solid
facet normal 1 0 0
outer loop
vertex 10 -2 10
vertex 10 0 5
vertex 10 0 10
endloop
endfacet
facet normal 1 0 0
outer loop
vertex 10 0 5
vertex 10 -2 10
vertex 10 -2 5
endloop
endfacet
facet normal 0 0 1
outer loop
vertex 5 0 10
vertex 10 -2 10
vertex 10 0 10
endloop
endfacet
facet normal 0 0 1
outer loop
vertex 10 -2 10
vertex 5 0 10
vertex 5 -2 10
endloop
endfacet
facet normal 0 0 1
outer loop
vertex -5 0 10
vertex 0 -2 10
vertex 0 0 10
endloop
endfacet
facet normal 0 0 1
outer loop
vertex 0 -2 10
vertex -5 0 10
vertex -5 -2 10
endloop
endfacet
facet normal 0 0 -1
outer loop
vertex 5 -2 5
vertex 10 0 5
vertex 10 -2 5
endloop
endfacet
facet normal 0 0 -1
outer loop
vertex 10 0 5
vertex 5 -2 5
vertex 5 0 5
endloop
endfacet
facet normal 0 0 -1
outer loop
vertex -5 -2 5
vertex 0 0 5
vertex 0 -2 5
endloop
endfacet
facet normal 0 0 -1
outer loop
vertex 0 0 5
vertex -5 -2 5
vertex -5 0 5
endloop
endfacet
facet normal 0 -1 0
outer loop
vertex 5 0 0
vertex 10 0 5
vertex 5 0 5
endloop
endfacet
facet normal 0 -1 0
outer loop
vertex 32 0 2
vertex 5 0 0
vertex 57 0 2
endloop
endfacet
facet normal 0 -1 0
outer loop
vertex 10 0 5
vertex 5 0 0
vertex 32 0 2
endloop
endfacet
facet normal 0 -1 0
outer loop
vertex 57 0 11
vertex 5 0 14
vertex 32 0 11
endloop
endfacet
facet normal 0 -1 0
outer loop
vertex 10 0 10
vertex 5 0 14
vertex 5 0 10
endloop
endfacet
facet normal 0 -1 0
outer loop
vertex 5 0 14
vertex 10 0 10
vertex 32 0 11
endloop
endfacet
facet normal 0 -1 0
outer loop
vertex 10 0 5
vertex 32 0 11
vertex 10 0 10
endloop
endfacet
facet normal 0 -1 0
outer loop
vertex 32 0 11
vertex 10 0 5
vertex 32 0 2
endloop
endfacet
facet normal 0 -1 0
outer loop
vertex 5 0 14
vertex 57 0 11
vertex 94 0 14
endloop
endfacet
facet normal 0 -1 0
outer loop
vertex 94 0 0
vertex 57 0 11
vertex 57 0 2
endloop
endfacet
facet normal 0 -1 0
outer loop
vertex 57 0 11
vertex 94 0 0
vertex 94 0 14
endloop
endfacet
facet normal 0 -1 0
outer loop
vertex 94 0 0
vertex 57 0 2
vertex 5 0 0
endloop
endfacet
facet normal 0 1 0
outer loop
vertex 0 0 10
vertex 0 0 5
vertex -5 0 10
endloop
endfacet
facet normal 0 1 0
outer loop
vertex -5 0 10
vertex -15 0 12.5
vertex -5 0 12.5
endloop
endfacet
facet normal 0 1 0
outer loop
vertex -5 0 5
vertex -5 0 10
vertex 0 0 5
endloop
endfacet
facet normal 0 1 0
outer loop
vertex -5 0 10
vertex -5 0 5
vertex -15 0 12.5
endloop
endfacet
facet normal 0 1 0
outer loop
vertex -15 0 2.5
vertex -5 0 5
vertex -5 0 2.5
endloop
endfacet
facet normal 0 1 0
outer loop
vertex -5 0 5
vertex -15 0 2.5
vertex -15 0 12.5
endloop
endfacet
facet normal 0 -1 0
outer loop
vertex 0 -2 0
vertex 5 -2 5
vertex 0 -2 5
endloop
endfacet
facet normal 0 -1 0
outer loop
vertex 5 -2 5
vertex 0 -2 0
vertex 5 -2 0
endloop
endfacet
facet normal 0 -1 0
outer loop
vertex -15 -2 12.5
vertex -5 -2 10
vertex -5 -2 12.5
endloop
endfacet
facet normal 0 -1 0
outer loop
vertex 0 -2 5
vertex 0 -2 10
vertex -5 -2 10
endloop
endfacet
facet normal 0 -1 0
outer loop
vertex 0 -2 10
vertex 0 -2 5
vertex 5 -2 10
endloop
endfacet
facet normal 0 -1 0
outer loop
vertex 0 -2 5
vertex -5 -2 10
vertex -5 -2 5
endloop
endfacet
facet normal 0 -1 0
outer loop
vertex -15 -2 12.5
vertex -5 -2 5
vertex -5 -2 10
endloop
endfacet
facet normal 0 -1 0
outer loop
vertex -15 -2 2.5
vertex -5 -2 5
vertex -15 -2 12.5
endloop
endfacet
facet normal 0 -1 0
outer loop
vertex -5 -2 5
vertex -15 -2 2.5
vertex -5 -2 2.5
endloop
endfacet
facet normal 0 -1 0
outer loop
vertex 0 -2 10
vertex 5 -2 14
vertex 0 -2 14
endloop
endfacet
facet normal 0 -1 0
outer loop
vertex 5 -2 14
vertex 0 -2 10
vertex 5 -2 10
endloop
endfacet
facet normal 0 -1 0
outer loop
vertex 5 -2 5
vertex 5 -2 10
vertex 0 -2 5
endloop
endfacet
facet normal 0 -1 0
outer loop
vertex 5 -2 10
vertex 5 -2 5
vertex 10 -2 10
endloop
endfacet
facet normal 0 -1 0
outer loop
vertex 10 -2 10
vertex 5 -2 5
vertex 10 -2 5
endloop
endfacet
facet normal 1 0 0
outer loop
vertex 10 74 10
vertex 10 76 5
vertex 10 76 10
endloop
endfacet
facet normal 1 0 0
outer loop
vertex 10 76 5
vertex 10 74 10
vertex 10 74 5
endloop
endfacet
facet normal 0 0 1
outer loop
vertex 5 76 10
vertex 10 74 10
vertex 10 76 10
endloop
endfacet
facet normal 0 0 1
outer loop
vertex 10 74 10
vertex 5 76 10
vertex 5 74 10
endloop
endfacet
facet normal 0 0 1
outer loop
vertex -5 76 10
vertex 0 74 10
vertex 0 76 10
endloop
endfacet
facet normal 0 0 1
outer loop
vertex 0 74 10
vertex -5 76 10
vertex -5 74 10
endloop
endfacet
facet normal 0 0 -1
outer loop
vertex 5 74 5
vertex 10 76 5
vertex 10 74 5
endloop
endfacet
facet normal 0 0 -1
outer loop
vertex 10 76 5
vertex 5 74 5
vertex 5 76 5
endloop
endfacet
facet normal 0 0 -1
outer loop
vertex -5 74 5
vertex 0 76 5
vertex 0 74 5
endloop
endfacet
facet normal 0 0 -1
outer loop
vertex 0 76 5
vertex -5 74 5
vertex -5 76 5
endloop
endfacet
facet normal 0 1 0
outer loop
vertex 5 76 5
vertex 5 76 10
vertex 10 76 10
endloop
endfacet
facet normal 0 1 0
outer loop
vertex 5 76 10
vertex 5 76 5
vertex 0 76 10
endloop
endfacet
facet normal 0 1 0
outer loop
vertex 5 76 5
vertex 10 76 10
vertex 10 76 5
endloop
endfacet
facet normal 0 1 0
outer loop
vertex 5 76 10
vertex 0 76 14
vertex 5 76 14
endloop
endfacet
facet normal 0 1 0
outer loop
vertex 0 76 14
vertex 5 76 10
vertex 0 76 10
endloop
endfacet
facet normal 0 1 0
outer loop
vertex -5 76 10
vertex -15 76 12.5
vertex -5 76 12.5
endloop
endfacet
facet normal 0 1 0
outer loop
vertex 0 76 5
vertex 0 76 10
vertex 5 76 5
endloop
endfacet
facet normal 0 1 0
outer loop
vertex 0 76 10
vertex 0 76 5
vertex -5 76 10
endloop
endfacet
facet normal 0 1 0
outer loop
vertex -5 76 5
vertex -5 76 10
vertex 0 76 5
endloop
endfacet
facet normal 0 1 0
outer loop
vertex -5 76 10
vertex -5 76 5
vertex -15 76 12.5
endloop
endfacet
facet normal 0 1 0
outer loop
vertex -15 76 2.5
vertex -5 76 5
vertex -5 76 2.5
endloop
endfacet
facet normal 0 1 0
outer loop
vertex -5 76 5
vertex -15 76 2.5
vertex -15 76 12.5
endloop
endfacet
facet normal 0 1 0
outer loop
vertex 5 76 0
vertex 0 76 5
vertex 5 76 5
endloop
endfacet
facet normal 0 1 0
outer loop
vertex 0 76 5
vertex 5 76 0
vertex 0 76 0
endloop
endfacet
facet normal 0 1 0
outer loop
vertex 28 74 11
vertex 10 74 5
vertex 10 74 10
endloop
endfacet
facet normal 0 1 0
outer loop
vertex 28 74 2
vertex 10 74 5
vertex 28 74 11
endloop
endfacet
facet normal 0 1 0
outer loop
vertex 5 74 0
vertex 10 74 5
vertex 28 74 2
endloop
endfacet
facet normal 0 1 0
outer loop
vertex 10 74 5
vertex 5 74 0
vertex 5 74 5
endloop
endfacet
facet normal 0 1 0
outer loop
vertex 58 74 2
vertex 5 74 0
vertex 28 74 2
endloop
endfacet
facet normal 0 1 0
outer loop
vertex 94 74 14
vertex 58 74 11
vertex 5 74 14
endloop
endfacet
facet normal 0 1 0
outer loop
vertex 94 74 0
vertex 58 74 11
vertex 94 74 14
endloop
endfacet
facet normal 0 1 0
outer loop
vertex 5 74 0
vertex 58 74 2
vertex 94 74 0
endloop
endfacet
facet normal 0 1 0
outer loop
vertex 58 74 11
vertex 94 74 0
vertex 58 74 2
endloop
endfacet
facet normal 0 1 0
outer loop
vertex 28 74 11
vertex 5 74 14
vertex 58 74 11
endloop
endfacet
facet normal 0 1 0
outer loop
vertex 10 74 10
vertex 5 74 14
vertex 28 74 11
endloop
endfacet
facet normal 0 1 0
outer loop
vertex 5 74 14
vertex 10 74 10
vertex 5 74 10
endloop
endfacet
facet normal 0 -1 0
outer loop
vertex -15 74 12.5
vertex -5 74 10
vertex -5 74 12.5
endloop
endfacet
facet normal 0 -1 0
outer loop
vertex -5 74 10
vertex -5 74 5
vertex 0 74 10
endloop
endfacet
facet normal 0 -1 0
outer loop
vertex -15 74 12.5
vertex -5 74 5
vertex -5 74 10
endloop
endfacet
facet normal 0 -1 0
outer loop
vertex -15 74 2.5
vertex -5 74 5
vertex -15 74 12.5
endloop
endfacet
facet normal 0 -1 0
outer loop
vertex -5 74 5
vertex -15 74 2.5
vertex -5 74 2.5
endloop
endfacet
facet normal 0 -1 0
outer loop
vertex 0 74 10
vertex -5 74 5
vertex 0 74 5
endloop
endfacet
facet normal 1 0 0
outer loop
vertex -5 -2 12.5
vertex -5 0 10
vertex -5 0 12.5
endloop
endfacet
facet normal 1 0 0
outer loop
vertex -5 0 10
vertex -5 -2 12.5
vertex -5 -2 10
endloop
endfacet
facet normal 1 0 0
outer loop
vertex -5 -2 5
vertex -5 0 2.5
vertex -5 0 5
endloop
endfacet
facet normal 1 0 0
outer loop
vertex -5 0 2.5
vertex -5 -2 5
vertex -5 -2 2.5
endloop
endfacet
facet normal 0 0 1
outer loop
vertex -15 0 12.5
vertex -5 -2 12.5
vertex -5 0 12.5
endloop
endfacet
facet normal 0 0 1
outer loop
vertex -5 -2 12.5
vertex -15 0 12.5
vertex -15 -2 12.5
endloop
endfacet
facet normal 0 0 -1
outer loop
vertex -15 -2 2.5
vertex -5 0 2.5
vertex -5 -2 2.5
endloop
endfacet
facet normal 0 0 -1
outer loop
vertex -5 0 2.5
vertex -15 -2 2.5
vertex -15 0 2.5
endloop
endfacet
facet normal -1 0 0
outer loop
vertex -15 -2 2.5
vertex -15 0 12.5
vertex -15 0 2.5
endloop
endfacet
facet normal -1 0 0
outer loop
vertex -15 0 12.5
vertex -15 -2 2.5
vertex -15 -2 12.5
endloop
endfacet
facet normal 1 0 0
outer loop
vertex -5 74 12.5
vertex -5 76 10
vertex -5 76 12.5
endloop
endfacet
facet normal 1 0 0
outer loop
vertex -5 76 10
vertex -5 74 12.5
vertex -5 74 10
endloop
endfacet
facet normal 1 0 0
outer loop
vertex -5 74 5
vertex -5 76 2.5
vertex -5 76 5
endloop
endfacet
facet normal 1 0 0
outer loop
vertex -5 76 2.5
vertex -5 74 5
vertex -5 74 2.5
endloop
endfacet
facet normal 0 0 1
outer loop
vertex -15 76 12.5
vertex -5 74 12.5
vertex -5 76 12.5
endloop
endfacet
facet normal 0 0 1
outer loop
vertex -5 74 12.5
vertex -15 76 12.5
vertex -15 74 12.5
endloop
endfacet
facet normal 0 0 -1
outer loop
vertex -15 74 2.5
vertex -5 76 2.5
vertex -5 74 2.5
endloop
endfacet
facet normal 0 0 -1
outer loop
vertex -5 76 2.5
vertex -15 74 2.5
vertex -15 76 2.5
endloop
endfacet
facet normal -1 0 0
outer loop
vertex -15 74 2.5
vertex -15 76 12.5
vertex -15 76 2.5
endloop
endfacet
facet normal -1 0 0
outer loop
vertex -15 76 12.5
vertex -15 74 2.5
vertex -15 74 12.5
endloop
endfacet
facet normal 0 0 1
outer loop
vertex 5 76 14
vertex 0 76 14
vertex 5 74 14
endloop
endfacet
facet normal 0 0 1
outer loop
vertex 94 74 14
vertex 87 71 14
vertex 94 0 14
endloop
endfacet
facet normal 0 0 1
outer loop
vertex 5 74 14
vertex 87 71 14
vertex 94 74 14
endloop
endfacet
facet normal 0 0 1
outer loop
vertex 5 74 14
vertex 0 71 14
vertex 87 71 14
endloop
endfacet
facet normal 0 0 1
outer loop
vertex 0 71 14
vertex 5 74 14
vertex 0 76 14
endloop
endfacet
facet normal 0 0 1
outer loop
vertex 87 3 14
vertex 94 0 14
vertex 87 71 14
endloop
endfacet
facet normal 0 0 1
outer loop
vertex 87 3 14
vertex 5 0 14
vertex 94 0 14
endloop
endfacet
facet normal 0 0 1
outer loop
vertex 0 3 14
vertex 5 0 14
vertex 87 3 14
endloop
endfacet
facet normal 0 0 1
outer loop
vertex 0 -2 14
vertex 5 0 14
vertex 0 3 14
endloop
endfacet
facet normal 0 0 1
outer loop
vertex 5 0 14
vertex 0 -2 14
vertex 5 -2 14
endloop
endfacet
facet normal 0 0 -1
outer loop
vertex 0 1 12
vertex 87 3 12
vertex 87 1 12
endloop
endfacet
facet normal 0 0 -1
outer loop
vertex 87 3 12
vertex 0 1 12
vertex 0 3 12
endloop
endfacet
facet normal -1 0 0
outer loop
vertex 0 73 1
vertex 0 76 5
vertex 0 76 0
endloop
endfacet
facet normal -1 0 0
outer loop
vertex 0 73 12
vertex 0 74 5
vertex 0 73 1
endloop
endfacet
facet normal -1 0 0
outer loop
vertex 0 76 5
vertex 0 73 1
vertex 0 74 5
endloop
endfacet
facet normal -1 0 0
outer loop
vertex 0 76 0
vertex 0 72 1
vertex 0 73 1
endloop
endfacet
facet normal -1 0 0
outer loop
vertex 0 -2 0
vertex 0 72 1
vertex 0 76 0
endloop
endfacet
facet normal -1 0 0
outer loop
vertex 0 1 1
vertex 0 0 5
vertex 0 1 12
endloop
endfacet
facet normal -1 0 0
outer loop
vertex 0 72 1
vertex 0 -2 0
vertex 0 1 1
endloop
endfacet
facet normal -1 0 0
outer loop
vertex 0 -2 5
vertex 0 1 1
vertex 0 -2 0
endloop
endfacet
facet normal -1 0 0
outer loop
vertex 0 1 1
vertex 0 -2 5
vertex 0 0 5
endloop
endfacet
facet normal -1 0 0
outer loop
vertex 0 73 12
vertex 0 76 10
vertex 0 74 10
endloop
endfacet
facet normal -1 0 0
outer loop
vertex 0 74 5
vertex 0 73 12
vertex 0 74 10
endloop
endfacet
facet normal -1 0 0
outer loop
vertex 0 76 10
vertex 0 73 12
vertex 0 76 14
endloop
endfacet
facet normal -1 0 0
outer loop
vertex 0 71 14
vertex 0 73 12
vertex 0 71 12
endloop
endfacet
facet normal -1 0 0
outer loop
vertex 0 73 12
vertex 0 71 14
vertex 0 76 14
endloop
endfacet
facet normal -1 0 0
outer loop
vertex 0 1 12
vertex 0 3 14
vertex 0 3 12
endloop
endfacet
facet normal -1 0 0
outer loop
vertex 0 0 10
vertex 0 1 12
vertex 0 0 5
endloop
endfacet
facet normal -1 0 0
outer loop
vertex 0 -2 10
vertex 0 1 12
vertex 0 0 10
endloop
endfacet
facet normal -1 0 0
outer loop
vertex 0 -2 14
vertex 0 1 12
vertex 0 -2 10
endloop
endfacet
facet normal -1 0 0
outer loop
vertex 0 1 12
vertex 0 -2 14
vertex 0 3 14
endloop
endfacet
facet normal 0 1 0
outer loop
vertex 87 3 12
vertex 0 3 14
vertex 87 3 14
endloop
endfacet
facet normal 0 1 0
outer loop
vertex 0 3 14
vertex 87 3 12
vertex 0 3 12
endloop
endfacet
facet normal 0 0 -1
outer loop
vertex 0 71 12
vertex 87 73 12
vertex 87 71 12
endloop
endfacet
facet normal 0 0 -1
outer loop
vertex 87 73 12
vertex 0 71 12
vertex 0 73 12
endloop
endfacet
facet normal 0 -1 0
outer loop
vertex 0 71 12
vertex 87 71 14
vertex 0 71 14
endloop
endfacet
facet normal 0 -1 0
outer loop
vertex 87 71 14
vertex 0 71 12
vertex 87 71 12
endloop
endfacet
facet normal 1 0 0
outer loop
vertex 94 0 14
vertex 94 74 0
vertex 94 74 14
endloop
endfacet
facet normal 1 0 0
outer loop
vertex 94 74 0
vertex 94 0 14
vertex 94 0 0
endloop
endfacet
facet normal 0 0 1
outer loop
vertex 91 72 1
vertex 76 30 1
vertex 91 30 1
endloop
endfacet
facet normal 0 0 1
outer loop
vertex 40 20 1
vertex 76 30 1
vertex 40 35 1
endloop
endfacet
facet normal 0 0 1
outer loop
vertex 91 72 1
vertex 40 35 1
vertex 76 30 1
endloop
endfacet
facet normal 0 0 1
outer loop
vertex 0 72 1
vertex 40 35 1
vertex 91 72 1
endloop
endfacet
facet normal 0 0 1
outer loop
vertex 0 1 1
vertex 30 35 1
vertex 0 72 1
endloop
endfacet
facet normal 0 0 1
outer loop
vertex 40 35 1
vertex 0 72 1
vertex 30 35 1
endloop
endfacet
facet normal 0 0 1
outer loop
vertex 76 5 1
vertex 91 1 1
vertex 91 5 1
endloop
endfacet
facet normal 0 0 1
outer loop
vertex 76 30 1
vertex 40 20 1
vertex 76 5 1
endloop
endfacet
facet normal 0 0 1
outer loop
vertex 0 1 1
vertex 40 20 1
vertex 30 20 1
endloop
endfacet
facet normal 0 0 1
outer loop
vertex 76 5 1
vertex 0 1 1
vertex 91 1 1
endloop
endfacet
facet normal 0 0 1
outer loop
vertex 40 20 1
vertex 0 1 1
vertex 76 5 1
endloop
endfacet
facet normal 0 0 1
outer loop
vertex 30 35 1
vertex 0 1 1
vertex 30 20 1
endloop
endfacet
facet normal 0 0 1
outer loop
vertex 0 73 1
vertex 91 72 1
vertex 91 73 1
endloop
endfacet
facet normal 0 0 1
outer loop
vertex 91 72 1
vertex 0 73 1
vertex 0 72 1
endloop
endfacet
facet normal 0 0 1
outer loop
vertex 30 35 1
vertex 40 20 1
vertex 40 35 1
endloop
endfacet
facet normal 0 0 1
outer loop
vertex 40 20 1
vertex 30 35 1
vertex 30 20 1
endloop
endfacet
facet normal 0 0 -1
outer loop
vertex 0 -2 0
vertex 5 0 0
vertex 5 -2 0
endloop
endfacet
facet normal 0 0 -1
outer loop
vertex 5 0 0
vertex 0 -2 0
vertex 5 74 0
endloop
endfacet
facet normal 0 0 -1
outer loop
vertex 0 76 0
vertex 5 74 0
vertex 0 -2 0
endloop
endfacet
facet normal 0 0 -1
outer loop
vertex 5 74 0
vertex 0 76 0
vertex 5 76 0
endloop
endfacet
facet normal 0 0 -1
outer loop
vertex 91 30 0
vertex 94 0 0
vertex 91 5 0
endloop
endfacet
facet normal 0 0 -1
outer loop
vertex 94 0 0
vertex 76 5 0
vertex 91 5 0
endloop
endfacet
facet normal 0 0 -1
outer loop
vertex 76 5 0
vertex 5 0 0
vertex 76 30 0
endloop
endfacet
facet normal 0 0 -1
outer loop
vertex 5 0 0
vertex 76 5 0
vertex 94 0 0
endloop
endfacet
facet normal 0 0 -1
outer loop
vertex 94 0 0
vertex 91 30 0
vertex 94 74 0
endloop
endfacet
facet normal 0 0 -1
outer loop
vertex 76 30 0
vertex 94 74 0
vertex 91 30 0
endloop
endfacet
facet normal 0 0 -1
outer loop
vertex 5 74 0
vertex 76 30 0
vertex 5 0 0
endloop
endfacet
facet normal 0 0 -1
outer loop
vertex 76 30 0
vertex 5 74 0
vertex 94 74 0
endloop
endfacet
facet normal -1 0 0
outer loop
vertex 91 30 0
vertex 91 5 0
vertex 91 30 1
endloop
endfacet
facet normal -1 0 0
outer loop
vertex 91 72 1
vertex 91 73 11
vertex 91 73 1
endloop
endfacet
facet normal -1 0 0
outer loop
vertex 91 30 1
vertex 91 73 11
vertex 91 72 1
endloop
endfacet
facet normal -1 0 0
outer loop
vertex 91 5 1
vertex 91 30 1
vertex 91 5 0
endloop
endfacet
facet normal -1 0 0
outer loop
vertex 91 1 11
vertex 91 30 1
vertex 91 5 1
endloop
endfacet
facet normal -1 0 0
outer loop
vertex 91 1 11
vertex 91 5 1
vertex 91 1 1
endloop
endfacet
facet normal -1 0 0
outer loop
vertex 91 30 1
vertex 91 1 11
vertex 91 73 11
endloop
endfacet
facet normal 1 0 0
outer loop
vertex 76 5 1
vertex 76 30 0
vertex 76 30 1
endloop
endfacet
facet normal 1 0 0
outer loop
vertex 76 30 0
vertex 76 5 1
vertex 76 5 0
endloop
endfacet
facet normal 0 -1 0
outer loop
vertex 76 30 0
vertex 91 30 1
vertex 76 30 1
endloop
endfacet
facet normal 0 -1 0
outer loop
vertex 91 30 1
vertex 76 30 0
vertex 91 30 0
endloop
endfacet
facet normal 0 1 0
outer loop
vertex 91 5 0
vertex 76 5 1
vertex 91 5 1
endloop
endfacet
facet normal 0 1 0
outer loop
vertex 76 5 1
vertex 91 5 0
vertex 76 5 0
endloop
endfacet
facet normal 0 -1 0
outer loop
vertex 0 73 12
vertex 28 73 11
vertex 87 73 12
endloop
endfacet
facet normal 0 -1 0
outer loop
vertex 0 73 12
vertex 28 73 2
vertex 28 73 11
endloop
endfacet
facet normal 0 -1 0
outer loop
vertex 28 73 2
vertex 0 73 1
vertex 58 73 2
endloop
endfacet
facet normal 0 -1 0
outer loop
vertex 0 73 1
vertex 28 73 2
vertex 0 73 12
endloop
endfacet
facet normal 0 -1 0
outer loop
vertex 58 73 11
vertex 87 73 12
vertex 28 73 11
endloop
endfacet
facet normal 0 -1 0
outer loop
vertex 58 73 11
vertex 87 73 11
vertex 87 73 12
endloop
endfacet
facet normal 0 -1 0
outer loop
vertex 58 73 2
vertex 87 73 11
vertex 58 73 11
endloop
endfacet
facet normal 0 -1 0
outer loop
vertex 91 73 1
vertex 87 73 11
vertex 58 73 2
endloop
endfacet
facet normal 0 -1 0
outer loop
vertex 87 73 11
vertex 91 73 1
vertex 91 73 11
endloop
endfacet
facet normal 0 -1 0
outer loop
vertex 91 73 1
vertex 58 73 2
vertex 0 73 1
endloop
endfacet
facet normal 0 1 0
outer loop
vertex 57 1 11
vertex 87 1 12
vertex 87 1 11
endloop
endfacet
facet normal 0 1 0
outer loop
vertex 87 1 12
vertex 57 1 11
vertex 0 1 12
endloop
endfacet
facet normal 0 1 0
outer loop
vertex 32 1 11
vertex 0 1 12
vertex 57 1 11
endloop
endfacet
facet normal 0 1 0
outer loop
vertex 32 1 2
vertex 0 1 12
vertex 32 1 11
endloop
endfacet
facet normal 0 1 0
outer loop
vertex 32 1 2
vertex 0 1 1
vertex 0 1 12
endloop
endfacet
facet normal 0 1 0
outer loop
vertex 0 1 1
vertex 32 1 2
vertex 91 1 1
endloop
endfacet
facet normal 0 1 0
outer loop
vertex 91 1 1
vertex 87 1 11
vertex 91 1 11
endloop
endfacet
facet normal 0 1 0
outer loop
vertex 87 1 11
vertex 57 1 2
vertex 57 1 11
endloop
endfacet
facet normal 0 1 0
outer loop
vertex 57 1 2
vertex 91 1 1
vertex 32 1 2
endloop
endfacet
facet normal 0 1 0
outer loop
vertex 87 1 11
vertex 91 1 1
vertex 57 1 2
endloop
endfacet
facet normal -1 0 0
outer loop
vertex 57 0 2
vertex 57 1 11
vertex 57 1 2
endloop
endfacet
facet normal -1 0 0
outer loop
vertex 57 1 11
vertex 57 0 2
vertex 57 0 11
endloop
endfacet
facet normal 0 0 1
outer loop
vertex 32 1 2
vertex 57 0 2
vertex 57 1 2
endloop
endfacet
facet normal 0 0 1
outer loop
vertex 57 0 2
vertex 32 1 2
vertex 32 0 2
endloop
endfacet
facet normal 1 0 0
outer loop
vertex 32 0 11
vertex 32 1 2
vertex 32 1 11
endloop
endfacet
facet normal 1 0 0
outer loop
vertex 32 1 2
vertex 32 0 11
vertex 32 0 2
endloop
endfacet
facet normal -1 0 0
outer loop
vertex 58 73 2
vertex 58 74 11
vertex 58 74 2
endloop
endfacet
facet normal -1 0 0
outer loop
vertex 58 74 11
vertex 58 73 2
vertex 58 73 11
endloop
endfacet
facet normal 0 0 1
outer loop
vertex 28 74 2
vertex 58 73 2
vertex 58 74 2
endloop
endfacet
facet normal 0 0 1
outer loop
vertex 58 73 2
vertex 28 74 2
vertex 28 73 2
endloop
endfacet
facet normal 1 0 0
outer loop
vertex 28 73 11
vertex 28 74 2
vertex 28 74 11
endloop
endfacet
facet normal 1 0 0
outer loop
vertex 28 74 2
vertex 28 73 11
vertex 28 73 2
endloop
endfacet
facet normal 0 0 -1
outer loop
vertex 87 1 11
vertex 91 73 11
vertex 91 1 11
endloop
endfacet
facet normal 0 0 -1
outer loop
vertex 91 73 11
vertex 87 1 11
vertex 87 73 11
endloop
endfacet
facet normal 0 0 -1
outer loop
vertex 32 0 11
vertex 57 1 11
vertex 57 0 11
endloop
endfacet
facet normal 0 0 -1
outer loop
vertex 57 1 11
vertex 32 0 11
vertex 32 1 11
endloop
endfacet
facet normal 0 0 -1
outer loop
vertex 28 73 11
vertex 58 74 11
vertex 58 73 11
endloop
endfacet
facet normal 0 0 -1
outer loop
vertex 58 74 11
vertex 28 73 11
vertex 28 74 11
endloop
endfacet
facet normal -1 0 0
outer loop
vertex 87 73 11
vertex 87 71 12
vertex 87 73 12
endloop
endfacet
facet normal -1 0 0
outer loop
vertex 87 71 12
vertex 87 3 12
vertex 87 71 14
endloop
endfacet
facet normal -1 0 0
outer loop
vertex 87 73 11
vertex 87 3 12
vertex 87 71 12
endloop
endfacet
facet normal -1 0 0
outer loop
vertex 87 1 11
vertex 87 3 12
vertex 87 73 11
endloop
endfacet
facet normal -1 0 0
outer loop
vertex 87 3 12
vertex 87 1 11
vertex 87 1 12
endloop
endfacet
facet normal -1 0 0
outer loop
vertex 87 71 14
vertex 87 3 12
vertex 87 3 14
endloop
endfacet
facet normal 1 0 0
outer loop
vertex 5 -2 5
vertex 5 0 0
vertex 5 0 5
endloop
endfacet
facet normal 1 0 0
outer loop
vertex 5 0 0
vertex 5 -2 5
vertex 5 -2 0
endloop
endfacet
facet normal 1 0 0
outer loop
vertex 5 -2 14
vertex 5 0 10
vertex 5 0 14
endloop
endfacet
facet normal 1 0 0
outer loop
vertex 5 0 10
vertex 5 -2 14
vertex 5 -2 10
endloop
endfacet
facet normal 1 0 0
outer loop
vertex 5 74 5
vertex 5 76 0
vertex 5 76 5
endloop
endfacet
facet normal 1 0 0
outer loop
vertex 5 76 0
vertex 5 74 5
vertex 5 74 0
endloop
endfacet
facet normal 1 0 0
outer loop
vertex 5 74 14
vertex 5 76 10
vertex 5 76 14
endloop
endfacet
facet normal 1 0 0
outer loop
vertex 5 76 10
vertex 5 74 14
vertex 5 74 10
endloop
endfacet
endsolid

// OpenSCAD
$fn = 128;
  module part1() { 
     translate ([-10, -2, 5]) cube ([20, 2, 5]);
     translate ([-10, 74, 5]) cube ([20, 2, 5]);
     translate ([-15, -2, 2.5]) cube ([10, 2, 10]);
     translate ([-15, 74, 2.5]) cube ([10, 2, 10]);
     translate ([0, 0, 12]) cube ([50, 3,  2,]);
     translate ([0, 71, 12]) cube ([50, 3,  2,]);
  }
  part1();
    rotate ([0, 0, 180]) translate ([0, -74, 0]);
  difference () {
    cube ([94, 72, 1]);
    translate ([30, 20, -10 ]) cube ([10, 15, 40]);
    translate ([76, 5, -1])cube ([15, 25, 3]);
  }

    translate ([0, 0, 12]) cube ([94, 3, 2]);
    translate ([0, 71, 12]) cube ([94, 3, 2]);
  difference () {
    cube ([94, 74, 12]);
    translate ([-1, 1, 1 ]) cube ([92, 72, 20]);
    translate ([76, 5, -1])cube ([15, 25, 3]);
    translate ([32, -2, 2]) cube ([25, 8, 10]);
    translate ([28, 72, 2]) cube ([30, 8, 10]);
  }
  difference () {
    translate ([0, 0, 11 ]) cube ([94, 74, 3]);
    translate ([-5, 1, 9 ]) cube ([92, 72, 20]);
    translate ([76, 5, -1])cube ([15, 25, 3]);
  }
    translate ([0, -2, 0])cube ([5, 2, 5]);
    translate ([0, -2, 9])cube ([5, 2, 5]);
    translate ([0, 74, 0])cube ([5, 2, 5]);
    translate ([0, 74, 9])cube ([5, 2, 5]);
  
